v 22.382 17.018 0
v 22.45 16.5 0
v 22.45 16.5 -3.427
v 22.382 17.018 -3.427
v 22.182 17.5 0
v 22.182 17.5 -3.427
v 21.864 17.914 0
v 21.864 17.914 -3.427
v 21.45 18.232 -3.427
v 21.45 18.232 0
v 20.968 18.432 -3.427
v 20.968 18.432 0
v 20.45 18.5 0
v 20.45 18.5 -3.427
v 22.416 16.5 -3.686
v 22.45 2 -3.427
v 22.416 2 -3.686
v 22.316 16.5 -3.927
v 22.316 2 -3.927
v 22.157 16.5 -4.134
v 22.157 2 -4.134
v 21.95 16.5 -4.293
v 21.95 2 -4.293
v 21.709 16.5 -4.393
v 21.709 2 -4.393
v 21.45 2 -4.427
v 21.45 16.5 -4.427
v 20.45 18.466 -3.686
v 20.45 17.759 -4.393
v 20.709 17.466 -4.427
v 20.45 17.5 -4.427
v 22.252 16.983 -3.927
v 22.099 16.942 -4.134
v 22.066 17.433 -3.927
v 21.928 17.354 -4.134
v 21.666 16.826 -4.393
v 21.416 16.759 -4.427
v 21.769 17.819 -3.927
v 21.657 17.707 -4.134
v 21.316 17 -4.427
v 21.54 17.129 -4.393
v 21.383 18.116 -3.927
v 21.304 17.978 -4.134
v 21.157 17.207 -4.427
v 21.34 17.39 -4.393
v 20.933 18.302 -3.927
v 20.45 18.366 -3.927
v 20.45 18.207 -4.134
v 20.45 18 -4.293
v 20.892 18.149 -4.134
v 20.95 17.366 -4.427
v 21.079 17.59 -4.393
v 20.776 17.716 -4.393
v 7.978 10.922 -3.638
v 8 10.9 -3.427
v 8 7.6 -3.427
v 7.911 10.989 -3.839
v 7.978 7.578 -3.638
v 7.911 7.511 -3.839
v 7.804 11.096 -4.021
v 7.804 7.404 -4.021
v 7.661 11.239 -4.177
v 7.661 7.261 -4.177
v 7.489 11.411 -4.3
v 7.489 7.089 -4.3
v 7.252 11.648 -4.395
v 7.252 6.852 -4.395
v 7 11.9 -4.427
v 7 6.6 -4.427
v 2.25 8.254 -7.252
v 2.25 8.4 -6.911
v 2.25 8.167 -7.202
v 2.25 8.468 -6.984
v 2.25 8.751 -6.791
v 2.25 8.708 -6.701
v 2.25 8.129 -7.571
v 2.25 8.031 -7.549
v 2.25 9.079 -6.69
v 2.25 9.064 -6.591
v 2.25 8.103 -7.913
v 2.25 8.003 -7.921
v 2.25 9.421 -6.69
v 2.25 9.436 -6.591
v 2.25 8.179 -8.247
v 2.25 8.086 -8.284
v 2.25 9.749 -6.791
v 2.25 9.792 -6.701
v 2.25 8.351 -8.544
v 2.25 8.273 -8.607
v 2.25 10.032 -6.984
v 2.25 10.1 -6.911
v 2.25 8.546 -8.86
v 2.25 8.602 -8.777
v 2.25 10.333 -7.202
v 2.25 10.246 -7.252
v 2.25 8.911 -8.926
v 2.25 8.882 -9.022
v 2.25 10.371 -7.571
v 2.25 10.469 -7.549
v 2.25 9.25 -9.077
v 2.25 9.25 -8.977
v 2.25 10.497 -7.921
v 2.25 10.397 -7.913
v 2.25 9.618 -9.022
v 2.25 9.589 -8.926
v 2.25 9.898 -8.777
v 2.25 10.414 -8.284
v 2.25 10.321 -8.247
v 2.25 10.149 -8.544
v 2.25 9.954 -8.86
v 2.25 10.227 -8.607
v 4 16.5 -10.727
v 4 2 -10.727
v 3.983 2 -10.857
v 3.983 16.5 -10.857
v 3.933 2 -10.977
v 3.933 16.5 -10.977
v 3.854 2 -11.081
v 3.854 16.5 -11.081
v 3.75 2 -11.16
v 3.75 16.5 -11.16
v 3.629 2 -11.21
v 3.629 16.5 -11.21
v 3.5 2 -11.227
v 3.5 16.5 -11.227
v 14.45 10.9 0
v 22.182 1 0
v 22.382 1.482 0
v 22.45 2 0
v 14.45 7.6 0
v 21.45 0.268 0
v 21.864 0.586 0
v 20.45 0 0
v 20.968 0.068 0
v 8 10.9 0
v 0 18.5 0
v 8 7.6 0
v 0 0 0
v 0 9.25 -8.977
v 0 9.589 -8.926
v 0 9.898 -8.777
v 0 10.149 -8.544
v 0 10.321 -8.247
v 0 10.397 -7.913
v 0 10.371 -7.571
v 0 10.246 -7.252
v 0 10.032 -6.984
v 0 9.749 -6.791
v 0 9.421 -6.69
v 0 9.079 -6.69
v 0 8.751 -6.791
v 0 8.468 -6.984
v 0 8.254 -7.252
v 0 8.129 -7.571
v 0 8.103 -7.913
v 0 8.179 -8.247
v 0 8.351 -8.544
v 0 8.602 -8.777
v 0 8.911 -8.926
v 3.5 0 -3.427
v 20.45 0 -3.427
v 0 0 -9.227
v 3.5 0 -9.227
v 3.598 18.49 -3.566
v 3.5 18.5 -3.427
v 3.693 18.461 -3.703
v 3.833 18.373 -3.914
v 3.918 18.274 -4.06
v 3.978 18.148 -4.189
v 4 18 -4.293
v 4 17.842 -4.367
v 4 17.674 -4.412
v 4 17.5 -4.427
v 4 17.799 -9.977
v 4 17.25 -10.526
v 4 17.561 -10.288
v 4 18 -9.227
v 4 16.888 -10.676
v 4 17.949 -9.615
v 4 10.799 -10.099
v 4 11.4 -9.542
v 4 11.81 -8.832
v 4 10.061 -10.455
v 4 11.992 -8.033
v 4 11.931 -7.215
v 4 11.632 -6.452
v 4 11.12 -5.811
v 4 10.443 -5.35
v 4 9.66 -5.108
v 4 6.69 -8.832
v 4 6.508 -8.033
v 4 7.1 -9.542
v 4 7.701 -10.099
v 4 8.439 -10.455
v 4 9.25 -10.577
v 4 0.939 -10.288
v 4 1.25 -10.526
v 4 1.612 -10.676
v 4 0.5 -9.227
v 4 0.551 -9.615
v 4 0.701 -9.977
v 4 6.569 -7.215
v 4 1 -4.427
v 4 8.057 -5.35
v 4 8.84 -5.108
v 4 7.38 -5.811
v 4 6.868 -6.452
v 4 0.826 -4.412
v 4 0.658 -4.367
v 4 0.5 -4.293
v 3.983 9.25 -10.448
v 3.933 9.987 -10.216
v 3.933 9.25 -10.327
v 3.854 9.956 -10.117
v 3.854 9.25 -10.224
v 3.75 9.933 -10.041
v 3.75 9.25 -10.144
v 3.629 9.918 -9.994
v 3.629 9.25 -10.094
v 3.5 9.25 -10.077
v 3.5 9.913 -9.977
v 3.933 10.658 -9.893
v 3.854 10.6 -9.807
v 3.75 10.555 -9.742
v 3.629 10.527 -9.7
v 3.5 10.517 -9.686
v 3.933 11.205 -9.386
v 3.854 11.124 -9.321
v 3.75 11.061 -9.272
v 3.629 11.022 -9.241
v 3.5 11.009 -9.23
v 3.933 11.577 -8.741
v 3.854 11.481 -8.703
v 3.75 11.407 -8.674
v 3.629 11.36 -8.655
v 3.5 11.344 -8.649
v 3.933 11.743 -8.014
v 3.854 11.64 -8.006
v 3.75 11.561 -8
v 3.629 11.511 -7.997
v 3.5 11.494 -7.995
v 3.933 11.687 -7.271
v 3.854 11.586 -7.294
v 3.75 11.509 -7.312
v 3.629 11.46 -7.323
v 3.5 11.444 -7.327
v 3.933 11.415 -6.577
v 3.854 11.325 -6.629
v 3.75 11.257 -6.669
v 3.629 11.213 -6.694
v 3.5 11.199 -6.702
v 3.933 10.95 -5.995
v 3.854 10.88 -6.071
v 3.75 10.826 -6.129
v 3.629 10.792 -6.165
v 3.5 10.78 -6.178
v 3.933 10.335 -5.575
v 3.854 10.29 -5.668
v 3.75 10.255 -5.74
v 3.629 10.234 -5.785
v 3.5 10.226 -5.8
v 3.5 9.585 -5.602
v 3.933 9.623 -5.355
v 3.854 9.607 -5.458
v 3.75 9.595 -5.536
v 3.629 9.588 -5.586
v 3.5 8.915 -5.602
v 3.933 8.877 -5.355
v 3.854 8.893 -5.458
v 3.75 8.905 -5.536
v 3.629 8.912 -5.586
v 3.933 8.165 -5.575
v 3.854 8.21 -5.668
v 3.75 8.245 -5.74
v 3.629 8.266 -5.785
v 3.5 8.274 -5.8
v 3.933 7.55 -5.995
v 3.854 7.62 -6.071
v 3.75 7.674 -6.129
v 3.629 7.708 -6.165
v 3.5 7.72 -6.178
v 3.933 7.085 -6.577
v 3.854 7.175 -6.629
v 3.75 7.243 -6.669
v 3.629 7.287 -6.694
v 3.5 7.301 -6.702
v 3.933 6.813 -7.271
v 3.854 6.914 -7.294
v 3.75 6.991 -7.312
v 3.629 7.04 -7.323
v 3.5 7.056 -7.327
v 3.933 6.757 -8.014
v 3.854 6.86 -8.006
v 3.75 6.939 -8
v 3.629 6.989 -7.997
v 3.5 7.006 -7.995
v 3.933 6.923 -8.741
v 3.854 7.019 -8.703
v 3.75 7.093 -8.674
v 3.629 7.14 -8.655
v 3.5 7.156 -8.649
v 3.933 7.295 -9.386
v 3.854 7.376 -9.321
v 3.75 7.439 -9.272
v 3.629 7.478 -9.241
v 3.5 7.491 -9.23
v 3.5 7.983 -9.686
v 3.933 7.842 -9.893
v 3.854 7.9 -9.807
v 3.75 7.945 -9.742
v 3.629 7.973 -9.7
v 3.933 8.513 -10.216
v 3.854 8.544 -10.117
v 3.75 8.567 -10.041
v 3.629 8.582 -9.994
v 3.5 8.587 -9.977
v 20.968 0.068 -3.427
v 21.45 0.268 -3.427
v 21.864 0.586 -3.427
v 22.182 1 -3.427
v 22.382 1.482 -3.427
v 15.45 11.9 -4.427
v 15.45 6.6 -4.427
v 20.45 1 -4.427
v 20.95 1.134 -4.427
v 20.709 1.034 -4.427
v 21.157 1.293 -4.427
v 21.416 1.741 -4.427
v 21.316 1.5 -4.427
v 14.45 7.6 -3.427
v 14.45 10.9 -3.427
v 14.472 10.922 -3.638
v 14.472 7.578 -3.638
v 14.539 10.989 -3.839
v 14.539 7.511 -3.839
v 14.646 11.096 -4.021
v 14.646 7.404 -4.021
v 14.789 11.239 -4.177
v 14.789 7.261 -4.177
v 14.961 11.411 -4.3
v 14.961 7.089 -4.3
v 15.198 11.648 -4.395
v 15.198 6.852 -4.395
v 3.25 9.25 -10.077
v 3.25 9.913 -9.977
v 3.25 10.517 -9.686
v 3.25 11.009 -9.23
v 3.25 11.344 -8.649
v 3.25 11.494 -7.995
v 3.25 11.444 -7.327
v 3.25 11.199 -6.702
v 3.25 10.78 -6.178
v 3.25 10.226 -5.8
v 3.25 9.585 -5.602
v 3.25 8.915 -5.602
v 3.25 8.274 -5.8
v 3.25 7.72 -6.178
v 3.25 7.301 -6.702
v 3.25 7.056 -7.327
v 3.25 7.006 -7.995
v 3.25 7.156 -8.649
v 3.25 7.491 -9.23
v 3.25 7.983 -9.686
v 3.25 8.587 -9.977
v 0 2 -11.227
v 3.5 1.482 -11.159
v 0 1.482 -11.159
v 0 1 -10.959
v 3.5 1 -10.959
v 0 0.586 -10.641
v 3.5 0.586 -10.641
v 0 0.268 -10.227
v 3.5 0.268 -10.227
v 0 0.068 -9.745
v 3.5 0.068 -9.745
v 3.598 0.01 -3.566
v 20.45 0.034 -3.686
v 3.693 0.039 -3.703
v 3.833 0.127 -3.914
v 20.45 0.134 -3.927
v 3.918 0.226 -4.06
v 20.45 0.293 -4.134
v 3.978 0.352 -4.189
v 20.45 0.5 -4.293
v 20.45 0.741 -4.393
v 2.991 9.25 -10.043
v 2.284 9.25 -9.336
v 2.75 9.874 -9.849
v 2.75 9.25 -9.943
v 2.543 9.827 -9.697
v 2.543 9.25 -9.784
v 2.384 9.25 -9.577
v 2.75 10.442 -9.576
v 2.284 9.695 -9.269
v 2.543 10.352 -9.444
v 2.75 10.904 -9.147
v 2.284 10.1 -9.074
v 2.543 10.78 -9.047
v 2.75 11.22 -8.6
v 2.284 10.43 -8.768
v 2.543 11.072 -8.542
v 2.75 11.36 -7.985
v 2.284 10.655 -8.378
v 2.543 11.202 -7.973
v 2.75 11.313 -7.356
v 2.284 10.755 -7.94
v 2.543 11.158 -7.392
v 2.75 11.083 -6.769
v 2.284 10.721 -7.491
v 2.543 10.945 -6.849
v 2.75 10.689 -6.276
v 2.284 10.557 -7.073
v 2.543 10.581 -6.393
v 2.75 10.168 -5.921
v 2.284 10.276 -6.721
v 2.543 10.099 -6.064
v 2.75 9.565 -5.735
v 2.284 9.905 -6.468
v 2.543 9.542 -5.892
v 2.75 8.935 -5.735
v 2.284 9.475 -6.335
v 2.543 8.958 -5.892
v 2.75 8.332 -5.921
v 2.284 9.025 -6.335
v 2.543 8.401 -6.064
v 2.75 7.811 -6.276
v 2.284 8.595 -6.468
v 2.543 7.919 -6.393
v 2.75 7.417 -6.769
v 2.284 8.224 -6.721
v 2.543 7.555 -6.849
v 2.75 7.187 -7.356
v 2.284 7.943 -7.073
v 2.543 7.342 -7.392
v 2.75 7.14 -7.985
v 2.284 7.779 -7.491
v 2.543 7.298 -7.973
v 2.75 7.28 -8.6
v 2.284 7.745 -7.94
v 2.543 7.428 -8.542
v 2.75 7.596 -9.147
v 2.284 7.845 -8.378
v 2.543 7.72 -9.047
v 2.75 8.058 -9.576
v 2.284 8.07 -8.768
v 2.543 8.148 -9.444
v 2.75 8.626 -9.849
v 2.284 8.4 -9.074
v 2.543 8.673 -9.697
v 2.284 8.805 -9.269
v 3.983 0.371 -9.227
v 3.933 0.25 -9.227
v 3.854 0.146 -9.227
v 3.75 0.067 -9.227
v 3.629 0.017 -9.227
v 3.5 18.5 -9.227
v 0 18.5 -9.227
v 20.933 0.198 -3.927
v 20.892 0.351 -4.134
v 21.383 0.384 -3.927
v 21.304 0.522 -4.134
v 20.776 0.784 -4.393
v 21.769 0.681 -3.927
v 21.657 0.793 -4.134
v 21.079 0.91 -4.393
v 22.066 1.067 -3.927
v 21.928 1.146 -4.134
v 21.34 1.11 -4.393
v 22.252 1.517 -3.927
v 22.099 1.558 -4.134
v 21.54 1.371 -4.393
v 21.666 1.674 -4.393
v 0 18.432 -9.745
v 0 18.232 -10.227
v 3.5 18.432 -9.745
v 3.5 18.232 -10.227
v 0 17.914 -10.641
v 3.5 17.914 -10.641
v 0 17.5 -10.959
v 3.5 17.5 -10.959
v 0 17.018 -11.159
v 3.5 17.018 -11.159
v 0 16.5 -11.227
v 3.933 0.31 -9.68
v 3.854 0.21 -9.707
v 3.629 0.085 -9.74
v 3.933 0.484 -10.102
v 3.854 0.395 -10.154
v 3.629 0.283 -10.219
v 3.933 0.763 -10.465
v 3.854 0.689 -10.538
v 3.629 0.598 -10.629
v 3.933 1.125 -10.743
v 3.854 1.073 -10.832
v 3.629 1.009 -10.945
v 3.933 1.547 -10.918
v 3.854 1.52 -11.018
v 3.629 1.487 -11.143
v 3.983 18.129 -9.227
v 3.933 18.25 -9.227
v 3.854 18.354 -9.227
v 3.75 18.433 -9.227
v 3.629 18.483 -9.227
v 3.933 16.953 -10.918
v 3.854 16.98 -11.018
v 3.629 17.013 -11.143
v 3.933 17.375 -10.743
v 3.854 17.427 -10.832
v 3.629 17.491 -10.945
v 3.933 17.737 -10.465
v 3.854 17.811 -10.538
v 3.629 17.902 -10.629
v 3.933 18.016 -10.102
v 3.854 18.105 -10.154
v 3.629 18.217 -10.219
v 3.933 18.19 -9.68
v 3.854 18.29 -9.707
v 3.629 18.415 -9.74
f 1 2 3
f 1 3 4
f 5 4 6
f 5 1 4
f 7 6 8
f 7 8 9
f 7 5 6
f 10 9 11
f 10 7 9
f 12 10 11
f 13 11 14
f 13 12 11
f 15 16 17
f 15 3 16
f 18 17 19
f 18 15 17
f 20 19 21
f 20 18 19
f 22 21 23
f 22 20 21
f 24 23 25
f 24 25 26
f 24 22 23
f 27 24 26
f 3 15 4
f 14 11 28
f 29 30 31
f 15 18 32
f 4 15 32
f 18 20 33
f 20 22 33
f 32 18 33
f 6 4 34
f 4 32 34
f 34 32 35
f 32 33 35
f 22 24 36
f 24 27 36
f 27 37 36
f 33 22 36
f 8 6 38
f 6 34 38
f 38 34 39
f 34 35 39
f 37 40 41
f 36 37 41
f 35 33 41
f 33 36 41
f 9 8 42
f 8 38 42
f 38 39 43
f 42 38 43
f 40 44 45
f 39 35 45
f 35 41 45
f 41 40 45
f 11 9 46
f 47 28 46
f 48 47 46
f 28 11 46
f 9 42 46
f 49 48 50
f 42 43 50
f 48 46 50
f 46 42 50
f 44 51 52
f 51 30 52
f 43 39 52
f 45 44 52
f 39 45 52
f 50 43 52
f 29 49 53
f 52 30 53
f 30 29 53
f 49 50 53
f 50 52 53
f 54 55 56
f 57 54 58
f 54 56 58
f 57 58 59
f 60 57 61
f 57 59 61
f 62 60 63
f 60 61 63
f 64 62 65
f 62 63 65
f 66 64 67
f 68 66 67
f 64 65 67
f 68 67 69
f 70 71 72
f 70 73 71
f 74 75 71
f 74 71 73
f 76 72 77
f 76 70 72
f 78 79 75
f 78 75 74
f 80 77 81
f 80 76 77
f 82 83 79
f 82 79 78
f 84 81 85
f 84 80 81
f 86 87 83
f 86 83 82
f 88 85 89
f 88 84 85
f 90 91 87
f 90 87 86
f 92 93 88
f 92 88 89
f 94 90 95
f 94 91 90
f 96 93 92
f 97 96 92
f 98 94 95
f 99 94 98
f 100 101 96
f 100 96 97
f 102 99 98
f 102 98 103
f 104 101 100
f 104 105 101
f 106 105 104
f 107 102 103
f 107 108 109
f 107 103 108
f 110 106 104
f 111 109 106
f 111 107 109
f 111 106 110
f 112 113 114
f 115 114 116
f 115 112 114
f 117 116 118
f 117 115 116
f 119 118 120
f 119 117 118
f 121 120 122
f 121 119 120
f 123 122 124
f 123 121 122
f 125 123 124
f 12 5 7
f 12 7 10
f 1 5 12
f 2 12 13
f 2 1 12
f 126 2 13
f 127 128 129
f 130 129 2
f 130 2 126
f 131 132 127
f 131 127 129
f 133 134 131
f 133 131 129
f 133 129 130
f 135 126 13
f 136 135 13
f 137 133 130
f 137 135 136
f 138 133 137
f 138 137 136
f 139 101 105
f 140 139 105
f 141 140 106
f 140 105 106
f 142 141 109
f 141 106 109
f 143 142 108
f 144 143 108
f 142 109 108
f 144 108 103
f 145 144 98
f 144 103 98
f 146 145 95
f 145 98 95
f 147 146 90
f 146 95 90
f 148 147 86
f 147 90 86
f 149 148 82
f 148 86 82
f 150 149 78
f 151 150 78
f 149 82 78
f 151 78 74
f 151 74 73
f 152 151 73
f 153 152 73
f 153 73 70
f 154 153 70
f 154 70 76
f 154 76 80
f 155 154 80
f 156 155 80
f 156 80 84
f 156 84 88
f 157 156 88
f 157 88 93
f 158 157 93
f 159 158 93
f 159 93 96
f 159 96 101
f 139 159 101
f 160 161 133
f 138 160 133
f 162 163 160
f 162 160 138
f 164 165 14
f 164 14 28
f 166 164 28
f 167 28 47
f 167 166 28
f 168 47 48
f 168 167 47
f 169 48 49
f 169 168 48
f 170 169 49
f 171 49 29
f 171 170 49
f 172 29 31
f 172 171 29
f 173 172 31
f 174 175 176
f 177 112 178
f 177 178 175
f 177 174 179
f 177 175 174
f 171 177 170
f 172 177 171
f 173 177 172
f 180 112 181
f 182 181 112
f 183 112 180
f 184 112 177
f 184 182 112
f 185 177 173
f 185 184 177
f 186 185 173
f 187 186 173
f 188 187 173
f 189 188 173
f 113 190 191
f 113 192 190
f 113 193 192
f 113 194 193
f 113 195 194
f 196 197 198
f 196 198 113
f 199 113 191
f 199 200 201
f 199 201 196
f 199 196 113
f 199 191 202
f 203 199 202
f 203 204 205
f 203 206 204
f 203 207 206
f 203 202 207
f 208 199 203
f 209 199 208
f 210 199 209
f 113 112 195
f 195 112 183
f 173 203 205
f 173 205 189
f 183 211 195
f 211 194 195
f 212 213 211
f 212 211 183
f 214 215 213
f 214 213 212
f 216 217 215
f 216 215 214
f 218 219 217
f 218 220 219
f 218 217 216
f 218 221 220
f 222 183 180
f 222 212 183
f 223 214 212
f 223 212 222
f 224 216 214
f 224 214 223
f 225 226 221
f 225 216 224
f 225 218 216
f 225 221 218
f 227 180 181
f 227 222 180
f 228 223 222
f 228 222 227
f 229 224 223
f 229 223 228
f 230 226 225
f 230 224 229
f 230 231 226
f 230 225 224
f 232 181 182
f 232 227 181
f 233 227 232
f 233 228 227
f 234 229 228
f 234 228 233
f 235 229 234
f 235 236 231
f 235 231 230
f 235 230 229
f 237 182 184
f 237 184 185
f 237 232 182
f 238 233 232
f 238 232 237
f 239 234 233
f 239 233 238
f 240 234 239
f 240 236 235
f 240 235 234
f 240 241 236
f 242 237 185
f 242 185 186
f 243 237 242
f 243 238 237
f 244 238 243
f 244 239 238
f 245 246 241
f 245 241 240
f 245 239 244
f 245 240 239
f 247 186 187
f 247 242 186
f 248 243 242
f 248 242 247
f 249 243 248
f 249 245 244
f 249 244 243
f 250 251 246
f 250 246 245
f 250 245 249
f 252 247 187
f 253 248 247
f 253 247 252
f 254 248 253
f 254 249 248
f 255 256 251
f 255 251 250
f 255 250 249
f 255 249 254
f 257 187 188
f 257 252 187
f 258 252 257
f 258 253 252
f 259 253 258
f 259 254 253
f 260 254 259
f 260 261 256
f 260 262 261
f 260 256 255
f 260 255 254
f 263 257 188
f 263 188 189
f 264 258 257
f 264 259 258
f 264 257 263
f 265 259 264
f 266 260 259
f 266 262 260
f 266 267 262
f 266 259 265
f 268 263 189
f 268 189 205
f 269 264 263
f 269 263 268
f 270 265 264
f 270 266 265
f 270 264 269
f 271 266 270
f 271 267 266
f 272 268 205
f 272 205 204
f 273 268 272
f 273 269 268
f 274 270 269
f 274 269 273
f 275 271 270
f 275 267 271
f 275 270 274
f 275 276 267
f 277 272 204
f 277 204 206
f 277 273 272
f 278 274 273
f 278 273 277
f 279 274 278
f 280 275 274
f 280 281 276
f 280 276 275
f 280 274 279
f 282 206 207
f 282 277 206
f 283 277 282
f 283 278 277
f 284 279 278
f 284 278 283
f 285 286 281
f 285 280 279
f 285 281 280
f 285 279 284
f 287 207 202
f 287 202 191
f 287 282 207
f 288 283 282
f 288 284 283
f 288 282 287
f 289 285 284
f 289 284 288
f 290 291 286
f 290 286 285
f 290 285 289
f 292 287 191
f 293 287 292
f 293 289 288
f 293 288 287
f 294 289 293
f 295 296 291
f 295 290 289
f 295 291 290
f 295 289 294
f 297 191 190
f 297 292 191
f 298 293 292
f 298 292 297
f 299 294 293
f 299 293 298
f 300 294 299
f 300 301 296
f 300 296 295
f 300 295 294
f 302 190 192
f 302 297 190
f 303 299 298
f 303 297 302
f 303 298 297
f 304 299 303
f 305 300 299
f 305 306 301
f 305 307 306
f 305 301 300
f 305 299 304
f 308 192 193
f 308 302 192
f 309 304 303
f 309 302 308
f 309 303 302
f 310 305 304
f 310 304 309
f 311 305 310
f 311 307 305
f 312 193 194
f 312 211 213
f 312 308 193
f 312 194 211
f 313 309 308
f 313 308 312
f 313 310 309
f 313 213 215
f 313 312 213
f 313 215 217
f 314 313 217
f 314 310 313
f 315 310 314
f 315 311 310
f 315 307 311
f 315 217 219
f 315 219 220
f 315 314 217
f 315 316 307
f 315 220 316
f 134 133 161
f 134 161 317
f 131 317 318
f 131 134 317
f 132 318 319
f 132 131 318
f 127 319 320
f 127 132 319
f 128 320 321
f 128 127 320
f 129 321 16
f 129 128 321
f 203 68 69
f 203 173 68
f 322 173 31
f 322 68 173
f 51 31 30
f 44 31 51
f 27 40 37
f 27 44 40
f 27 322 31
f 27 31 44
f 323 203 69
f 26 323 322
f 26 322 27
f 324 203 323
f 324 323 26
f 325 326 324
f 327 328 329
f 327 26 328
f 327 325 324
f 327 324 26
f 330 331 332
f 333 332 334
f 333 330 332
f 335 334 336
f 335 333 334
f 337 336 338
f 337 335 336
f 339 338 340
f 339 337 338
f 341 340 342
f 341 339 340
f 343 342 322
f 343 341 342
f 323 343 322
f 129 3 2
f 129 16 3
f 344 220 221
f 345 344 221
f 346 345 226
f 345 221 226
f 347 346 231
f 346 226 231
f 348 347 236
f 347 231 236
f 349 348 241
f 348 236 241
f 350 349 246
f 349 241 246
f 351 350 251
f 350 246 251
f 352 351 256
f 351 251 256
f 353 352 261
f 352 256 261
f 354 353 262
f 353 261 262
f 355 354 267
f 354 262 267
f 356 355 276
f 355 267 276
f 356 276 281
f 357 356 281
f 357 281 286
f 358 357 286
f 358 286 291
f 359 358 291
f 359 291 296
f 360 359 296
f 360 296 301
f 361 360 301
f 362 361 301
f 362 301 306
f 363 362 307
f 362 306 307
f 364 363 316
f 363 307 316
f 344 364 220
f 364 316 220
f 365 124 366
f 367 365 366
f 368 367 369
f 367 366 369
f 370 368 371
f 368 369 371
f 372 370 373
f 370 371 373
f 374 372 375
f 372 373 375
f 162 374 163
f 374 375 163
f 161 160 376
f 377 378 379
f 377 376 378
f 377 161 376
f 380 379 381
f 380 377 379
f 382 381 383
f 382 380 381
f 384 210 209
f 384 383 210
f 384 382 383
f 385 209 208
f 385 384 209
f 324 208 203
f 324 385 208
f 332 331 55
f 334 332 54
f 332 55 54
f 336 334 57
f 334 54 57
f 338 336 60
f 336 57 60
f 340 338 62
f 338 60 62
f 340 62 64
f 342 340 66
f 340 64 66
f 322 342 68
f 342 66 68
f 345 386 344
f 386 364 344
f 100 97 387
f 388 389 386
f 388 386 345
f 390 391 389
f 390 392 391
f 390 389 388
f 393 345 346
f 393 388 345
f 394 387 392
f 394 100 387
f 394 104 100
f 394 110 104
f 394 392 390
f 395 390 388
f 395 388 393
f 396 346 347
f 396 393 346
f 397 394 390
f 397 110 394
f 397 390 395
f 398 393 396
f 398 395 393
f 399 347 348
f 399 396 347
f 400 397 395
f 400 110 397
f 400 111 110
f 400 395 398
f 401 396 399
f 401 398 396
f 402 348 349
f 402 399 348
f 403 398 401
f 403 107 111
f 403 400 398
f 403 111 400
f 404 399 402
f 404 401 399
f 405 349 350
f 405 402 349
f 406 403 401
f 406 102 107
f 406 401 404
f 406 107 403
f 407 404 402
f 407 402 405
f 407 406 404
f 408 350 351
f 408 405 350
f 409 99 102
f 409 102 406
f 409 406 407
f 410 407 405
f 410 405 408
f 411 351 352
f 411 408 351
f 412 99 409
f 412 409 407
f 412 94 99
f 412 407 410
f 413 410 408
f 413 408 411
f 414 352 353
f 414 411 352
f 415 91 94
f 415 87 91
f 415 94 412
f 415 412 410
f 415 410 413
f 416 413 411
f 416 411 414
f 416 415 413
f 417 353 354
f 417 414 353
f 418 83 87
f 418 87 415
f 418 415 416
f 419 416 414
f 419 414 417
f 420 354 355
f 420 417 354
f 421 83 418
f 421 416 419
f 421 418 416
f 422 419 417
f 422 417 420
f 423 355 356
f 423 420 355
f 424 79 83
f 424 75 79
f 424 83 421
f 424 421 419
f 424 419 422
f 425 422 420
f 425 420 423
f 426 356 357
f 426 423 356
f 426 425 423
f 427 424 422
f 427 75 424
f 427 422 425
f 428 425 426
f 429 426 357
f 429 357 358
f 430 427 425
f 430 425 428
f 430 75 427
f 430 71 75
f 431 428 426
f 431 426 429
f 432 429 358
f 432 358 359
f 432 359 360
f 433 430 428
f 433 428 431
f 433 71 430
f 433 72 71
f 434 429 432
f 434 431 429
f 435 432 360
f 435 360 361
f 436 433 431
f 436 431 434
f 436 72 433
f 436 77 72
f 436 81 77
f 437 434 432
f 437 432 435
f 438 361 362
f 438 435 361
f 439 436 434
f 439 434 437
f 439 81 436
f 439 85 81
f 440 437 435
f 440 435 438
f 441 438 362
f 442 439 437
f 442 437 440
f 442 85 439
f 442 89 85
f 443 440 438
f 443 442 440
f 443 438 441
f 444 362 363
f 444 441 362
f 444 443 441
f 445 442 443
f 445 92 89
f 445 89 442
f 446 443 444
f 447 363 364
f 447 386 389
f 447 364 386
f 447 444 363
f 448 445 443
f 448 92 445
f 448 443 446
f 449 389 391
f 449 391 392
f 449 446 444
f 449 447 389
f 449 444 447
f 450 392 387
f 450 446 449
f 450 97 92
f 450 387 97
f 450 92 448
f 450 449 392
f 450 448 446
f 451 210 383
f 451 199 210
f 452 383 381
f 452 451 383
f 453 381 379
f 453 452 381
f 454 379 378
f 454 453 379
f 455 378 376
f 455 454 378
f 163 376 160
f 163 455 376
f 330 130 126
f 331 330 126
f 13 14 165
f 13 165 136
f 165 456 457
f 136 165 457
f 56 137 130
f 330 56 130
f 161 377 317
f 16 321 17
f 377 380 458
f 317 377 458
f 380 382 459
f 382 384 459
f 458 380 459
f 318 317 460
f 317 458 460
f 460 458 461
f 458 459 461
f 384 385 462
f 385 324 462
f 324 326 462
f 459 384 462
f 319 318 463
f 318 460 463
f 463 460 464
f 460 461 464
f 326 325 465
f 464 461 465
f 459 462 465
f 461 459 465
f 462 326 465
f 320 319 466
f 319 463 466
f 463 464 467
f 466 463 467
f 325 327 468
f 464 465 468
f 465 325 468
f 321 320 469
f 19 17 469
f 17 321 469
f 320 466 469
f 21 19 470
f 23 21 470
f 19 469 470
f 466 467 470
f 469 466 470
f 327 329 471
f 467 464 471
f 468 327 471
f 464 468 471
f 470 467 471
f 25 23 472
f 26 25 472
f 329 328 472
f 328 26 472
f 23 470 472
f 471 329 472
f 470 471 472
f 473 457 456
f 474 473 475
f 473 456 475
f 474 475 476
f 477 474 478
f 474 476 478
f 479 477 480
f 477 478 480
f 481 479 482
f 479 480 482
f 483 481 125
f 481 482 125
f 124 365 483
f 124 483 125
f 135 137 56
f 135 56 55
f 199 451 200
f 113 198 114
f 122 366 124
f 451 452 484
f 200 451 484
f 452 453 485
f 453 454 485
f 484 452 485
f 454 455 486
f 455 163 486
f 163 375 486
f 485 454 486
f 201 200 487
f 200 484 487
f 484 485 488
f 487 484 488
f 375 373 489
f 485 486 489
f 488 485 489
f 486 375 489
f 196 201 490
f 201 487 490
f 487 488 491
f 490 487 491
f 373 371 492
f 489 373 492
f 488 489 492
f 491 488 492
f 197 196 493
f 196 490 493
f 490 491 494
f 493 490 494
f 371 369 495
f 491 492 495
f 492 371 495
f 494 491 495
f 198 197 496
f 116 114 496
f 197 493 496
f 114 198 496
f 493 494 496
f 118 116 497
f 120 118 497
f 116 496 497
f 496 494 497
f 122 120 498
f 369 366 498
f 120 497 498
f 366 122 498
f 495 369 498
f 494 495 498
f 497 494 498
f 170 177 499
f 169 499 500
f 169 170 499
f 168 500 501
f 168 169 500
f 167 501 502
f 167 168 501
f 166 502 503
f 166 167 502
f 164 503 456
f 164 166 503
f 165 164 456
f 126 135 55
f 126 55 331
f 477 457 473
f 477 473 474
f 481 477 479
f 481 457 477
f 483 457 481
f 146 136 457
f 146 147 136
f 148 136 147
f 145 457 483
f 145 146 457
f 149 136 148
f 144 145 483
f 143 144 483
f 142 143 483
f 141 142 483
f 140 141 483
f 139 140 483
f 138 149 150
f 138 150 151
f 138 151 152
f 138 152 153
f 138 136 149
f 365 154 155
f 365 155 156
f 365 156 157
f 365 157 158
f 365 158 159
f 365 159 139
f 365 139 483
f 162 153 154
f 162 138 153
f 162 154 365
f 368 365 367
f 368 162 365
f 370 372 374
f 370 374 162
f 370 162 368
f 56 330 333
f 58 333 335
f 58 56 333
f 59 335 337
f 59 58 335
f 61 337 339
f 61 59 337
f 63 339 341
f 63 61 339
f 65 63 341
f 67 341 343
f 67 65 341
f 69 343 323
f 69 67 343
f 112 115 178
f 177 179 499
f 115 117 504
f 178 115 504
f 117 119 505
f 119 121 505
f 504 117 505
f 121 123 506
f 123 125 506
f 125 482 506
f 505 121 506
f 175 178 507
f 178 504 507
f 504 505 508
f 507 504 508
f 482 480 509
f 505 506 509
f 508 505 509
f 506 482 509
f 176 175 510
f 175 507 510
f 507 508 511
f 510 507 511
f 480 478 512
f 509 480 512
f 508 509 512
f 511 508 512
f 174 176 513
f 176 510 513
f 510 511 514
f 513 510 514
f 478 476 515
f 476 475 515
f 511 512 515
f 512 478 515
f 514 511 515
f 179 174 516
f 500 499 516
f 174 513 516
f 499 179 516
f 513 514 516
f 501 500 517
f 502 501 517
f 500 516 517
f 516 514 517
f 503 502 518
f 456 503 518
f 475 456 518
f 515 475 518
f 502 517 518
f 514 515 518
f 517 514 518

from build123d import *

# Parameters (mm, degrees)
BOSS_EXTRUDE1_DEPTH = 18.5
SKETCH2_W           = 6.45
SKETCH2_H           = 3.3
CUT_EXTRUDE1_DEPTH  = 4.5
SKETCH3_R           = 2.25
CUT_EXTRUDE2_DEPTH  = 1.75
SKETCH4_R           = 1.15
CUT_EXTRUDE3_DEPTH  = 2.3
FILLET3_R           = 2
FILLET4_R           = 2
FILLET5_R           = 2
FILLET6_R           = 2
FILLET7_R           = 1
FILLET8_R           = 0.5
FILLET9_R           = 1
FILLET10_R          = 1
FILLET12_R          = 0.5


with BuildPart() as part:
    # Sketch1 → Boss-Extrude1 (new body)
    with BuildSketch(Plane(origin=(0, 0, 0), x_dir=(1, 0, 0), z_dir=(0, 1, 0))):
        Polygon((0, 0), (0, 11.227239651), (4, 11.227239651), (4, 4.427239651), (22.45, 4.427239651), (22.45, 0), align=None)
    extrude(amount=BOSS_EXTRUDE1_DEPTH)

    # Sketch2 → Cut-Extrude1 (cut)
    with BuildSketch(Plane.XY):
        with Locations((11.225, 9.25)):
            Rectangle(SKETCH2_W, SKETCH2_H)
    extrude(amount=-CUT_EXTRUDE1_DEPTH, mode=Mode.SUBTRACT)

    # Sketch3 → Cut-Extrude2 (cut)
    with BuildSketch(Plane(origin=(4, 0, 0), x_dir=(0, 0, -1), z_dir=(1, 0, 0))):
        with Locations((7.827239651, 9.25)):
            Circle(SKETCH3_R)
    extrude(amount=-CUT_EXTRUDE2_DEPTH, mode=Mode.SUBTRACT)

    # Sketch4 → Cut-Extrude3 (cut)
    with BuildSketch(Plane(origin=(2.25, 0, 0), x_dir=(0, 0, -1), z_dir=(1, 0, 0))):
        with Locations((7.827239651, 9.25)):
            Circle(SKETCH4_R)
    extrude(amount=-CUT_EXTRUDE3_DEPTH, mode=Mode.SUBTRACT)

    # Fillet3
    fillet3_edges = [part.edges().sort_by_distance(p)[0] for p in [
        (2, 18.5, -11.227239651),
    ]]
    fillet(fillet3_edges, radius=FILLET3_R)

    # Fillet4
    fillet4_edges = [part.edges().sort_by_distance(p)[0] for p in [
        (2, 0, -11.227239651),
    ]]
    fillet(fillet4_edges, radius=FILLET4_R)

    # Fillet5
    fillet5_edges = [part.edges().sort_by_distance(p)[0] for p in [
        (22.45, 0, -2.213619825),
    ]]
    fillet(fillet5_edges, radius=FILLET5_R)

    # Fillet6
    fillet6_edges = [part.edges().sort_by_distance(p)[0] for p in [
        (22.45, 18.5, -2.213619825),
    ]]
    fillet(fillet6_edges, radius=FILLET6_R)

    # Fillet7
    fillet7_edges = [part.edges().sort_by_distance(p)[0] for p in [
        (11.225, 10.9, -4.427239651),
        (8, 9.25, -4.427239651),
        (11.225, 7.6, -4.427239651),
        (14.45, 9.25, -4.427239651),
    ]]
    fillet(fillet7_edges, radius=FILLET7_R)

    # Fillet8
    fillet8_edges = [part.edges().sort_by_distance(p)[0] for p in [
        (4, 9.25, -5.577239651),
    ]]
    fillet(fillet8_edges, radius=FILLET8_R)

    # Fillet9
    fillet9_edges = [part.edges().sort_by_distance(p)[0] for p in [
        (2.25, 9.25, -5.577239651),
    ]]
    fillet(fillet9_edges, radius=FILLET9_R)

    # Fillet10
    fillet10_edges = [part.edges().sort_by_distance(p)[0] for p in [
        (12.225, 0, -4.427239651),
        (21.864213562, 0.585786438, -4.427239651),
        (12.225, 18.5, -4.427239651),
        (22.45, 9.25, -4.427239651),
        (21.864213562, 17.914213562, -4.427239651),
    ]]
    fillet(fillet10_edges, radius=FILLET10_R)

    # Fillet12
    fillet12_edges = [part.edges().sort_by_distance(p)[0] for p in [
        (4, 18.5, -6.827239651),
        (4, 9.25, -11.227239651),
        (4, 17.914213562, -10.641453213),
        (4, 0.585786438, -10.641453213),
        (4, 0, -6.827239651),
    ]]
    fillet(fillet12_edges, radius=FILLET12_R)


solid = part.part
